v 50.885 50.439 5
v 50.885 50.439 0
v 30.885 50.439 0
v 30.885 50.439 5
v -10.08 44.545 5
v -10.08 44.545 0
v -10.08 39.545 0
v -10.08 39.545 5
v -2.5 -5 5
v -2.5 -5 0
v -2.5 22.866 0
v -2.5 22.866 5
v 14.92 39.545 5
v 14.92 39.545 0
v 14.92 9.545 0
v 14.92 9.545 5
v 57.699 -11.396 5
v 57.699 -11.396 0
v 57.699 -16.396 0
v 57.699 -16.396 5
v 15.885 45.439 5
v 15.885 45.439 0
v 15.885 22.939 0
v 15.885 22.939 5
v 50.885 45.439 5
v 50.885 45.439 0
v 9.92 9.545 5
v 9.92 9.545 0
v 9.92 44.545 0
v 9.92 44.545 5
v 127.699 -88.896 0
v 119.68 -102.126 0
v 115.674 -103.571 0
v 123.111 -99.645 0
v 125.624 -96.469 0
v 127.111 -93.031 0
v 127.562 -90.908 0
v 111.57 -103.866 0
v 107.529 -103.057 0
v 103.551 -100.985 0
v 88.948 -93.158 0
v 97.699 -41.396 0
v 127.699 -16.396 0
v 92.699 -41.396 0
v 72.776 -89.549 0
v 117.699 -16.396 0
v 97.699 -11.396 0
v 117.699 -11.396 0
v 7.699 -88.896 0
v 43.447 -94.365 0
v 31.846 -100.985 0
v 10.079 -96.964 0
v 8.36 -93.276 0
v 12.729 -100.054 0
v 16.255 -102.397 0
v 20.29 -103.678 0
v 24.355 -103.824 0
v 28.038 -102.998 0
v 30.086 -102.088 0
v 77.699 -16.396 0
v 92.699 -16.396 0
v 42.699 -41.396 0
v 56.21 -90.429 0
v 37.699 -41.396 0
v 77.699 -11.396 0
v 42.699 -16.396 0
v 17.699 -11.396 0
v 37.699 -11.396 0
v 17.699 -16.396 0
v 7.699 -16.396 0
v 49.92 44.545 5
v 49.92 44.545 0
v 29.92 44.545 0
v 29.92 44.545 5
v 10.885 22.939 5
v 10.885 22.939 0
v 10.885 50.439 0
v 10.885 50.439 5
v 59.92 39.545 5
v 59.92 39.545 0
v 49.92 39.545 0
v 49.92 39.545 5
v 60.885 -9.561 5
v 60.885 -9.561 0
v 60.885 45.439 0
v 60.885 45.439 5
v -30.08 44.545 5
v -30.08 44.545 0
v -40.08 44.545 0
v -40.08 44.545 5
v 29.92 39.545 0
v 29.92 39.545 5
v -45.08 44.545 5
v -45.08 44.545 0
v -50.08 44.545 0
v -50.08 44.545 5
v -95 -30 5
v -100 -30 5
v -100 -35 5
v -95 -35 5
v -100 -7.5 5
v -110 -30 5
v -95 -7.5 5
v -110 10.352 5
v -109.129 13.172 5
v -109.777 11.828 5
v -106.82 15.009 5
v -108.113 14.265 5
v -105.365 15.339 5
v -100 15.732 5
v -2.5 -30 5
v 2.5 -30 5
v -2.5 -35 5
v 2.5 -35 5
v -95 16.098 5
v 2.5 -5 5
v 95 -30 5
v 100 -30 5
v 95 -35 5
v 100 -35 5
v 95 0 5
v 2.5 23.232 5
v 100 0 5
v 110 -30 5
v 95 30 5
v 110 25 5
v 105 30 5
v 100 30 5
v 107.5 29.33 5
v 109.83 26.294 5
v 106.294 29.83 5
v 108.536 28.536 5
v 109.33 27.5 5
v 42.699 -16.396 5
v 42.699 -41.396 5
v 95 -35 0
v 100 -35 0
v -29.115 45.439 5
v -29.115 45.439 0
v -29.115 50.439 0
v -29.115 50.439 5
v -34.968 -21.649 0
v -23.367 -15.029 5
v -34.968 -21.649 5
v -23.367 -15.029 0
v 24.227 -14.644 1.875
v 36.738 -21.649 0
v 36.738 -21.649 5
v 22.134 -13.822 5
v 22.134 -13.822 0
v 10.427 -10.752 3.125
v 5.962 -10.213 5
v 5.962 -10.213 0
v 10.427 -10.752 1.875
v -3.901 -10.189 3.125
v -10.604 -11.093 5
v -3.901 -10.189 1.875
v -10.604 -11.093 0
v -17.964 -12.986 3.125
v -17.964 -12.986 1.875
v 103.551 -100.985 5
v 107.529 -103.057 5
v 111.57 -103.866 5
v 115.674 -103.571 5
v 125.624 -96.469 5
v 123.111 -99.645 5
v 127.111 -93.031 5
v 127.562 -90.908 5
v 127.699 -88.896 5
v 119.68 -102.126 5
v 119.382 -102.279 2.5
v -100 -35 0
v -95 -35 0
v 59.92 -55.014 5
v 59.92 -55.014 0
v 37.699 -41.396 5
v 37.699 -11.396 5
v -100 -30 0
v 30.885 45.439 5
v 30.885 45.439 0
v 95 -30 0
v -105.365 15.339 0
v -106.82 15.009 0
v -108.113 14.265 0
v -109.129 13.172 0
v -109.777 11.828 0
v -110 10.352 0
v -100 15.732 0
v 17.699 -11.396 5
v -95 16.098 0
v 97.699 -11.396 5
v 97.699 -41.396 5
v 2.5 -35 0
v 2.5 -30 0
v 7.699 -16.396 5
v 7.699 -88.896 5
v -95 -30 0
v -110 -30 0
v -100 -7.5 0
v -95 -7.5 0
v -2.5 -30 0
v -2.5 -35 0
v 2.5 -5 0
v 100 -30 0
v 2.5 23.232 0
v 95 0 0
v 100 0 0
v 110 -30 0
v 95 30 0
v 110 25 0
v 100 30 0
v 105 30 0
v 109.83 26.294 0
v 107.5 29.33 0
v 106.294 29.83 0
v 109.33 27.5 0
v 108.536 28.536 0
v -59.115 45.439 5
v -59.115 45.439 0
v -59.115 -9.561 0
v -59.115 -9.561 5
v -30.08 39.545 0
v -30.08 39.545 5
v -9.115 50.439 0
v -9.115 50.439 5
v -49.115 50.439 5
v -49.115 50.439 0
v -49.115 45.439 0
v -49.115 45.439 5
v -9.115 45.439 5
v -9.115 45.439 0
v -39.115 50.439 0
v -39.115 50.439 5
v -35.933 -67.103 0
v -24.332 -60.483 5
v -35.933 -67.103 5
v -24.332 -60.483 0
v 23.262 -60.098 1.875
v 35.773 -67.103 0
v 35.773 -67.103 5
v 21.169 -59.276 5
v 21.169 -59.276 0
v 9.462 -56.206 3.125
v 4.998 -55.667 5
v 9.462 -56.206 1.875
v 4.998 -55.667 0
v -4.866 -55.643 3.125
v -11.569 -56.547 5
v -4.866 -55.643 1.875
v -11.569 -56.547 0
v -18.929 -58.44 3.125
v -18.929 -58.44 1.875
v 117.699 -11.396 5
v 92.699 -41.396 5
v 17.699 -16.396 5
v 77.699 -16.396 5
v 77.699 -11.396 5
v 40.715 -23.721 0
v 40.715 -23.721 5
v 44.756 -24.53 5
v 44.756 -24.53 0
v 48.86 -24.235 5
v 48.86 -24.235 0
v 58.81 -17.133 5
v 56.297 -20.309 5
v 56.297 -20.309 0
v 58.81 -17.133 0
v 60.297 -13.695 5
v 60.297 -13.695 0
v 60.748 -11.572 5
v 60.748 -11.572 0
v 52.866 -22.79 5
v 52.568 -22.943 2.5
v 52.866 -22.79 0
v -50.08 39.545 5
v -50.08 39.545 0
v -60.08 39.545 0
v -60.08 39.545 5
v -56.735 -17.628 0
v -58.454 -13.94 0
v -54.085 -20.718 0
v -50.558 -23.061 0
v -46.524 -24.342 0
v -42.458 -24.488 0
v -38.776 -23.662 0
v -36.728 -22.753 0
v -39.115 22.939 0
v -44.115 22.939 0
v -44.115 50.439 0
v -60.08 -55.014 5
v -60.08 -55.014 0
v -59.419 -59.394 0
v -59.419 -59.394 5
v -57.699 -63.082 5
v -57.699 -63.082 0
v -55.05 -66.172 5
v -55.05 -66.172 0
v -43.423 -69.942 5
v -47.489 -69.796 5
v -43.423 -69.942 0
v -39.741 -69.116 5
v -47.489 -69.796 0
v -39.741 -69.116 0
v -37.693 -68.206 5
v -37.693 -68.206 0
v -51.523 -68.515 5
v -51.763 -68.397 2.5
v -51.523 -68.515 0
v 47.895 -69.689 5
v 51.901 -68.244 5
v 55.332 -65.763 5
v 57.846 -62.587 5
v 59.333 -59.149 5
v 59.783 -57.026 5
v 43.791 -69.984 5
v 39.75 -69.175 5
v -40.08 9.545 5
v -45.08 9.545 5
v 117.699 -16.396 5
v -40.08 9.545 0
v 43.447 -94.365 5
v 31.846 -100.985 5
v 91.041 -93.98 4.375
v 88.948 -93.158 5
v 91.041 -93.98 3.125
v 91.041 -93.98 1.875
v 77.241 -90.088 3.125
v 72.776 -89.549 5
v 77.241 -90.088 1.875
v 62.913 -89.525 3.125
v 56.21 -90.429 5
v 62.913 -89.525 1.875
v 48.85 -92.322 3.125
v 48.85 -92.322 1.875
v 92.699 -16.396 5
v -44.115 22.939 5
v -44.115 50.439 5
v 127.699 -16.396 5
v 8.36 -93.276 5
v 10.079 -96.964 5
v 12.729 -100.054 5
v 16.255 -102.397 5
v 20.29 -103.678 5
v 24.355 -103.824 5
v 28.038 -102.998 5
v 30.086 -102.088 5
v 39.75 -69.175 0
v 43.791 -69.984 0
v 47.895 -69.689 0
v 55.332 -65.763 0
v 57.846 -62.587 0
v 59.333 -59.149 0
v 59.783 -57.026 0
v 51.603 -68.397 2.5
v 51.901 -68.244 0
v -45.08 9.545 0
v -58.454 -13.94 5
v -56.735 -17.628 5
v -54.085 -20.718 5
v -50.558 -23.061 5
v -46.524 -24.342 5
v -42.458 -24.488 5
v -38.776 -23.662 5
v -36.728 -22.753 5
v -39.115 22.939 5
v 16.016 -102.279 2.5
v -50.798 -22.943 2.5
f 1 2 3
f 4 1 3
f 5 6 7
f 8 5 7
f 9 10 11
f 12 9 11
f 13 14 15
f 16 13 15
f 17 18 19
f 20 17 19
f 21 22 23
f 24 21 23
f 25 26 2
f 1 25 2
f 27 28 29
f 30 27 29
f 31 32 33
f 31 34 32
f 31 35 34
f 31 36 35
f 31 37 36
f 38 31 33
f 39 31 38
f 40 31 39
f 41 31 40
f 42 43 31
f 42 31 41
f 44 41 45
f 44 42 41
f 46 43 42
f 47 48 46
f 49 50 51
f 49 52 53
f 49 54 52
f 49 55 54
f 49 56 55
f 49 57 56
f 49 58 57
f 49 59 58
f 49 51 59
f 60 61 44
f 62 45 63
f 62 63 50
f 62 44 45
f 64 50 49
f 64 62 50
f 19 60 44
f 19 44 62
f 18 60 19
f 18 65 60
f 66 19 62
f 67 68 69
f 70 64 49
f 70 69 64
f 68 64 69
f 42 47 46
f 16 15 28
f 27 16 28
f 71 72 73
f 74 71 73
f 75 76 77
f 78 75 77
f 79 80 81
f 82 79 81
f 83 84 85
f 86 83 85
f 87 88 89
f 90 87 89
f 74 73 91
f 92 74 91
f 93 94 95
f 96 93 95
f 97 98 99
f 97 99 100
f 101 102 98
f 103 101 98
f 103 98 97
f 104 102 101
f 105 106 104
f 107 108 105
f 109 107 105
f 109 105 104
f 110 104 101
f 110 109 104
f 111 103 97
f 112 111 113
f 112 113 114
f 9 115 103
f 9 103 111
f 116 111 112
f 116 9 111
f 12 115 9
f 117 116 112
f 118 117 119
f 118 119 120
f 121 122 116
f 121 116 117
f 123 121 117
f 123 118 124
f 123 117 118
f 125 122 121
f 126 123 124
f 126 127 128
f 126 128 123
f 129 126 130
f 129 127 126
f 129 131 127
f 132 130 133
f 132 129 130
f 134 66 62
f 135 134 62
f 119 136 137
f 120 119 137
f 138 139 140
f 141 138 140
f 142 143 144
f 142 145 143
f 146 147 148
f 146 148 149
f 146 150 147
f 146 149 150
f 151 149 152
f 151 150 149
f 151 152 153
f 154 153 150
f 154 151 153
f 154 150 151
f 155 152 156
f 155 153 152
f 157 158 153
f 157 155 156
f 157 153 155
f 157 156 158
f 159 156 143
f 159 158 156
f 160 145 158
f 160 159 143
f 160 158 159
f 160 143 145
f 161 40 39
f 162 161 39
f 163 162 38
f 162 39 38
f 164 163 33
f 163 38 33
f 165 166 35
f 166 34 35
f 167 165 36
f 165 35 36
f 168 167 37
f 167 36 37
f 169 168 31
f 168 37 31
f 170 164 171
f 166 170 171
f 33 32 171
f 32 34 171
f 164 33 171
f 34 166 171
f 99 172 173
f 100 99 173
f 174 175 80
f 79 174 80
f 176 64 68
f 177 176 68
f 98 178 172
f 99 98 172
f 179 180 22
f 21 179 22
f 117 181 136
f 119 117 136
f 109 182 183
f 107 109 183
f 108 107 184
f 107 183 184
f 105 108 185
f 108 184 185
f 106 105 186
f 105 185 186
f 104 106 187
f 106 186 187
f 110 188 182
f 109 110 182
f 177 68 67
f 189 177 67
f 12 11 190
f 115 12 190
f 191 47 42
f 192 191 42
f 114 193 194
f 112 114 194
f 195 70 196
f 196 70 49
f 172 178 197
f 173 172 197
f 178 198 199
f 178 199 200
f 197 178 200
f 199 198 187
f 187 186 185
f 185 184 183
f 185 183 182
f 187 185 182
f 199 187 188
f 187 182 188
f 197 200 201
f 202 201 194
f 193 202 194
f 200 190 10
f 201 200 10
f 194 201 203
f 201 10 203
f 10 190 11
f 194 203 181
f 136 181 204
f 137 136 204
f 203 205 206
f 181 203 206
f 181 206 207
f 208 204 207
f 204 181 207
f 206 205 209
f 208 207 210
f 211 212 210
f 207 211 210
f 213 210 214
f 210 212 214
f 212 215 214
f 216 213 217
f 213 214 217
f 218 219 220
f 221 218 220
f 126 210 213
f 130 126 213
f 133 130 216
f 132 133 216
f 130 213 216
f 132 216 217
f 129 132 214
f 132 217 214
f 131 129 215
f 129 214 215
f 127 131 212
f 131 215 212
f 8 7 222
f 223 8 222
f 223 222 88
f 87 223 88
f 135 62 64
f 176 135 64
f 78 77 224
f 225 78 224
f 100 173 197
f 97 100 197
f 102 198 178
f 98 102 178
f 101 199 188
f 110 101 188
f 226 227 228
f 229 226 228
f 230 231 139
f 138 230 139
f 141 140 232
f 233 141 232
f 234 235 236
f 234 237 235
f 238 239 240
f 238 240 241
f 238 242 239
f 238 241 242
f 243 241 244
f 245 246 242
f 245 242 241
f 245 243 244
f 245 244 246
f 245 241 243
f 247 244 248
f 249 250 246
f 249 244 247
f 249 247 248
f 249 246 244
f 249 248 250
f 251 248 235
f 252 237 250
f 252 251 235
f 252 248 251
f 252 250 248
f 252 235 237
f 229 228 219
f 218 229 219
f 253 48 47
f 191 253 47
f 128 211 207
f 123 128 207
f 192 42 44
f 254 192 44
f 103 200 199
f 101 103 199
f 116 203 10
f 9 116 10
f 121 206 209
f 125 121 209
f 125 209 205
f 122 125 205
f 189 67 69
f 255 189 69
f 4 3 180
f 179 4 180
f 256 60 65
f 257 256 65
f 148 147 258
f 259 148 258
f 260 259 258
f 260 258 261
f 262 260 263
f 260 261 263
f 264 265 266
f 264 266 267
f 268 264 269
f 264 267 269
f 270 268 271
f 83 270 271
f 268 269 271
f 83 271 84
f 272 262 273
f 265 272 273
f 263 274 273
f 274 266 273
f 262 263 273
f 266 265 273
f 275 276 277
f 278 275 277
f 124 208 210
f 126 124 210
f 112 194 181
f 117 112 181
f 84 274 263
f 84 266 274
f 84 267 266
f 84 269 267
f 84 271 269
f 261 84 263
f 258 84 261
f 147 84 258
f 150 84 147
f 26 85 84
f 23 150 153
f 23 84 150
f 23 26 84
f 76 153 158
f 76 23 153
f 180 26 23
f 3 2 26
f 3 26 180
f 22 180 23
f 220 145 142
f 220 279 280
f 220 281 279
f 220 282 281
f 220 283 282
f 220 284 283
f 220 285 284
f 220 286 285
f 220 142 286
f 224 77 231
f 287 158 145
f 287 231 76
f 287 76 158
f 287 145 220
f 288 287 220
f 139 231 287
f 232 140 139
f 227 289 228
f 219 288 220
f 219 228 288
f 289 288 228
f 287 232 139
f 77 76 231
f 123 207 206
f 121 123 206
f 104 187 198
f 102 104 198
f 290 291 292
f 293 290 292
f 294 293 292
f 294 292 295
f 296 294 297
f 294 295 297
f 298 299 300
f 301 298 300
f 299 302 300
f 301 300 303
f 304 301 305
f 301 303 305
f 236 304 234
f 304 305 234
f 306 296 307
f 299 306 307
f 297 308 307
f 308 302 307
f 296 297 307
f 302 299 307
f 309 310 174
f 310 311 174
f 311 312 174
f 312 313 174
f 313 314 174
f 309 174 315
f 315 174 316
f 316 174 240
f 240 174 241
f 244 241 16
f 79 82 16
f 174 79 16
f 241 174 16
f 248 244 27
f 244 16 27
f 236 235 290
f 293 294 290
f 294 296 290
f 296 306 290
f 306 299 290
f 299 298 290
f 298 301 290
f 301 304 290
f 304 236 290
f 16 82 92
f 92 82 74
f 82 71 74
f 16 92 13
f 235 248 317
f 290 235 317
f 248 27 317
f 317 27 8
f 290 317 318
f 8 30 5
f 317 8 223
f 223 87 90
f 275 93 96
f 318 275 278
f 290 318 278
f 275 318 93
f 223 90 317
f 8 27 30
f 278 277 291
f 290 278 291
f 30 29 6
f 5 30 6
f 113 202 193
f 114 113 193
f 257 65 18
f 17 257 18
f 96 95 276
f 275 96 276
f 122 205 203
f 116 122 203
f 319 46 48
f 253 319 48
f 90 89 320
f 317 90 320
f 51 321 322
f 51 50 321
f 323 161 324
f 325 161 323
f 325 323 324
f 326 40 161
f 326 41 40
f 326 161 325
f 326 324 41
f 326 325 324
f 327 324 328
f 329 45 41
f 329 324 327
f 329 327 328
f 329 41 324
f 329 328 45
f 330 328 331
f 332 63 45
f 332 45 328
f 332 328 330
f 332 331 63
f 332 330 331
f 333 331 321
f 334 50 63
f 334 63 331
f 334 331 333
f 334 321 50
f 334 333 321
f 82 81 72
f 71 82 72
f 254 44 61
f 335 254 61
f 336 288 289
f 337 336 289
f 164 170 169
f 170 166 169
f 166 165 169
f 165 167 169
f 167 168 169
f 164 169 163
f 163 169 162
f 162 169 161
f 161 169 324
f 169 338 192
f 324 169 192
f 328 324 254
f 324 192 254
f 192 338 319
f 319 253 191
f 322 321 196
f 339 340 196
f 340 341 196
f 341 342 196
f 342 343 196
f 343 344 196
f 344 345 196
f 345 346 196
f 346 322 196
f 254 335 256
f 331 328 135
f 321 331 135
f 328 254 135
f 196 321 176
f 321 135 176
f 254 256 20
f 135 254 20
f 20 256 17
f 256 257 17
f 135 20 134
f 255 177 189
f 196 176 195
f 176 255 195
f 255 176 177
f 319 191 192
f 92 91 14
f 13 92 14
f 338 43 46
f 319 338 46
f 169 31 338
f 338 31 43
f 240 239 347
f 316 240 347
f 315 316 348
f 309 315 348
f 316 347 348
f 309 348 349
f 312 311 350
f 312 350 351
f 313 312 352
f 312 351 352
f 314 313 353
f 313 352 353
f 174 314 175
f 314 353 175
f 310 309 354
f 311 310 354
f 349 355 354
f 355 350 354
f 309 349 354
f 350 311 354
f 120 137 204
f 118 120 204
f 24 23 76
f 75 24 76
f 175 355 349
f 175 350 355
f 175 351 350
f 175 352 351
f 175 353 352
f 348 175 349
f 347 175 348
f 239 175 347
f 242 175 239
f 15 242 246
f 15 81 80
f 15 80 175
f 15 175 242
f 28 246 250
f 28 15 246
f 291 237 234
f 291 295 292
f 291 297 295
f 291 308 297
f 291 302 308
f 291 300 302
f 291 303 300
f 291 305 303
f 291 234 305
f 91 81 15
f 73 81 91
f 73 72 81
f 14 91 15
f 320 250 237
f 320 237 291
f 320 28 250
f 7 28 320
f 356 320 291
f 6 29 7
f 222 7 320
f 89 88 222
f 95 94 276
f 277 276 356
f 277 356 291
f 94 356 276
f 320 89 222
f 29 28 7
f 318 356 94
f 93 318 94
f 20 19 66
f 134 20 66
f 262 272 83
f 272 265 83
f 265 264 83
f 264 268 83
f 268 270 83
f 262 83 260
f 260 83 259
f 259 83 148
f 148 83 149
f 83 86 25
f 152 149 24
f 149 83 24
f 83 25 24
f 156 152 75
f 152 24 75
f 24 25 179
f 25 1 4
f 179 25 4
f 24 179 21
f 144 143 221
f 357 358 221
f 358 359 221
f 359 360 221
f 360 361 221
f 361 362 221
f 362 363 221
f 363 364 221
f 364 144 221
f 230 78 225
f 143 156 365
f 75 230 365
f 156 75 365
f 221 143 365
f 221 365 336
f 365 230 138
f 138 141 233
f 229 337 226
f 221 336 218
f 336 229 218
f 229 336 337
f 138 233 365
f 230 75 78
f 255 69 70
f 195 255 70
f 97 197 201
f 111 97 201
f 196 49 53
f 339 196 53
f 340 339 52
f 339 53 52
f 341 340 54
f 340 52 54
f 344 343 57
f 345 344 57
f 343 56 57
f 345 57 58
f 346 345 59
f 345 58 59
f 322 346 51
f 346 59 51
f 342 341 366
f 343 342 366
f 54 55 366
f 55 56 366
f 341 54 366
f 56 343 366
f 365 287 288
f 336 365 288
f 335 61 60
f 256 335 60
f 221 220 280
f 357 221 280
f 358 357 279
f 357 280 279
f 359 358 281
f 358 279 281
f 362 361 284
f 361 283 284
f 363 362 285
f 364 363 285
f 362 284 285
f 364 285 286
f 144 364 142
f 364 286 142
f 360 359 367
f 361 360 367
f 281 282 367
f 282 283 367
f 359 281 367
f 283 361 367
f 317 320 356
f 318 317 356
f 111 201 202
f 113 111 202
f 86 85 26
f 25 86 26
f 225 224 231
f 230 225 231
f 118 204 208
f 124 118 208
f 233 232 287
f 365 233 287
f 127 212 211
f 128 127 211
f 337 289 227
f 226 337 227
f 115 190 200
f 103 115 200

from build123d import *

# Parameters (mm, degrees)
F5_DEPTH = 5
F6_DEPTH = 5
F7_DEPTH = 5
F8_DEPTH = 5


# Not quite as in the source:
# - the dataset's text gives a spline's control points without its knots; the knots are read off the source's solid


with BuildPart() as f5:
    # F1 (on Top) → F5 (new body)
    with BuildSketch(Plane.XY):
        with BuildLine():
            add(Edge.make_bspline(
                [(35.7727633026, -67.1033849488), (33.1888546546, -65.2263313398), (27.7258131524, -61.8786878763), (18.8464933001, -58.2010364024), (9.5012368587, -55.9575441024), (-0.0799322126, -55.2035239896), (-9.661101284, -55.9575441023), (-19.0063577254, -58.2010364023), (-27.8856775777, -61.8786878761), (-33.3487190799, -65.2263313396), (-35.932627728, -67.1033849485)],
                knots=[0.2739165322, 0.2739165322, 0.2739165322, 0.2739165322, 0.3304373991, 0.3869582661, 0.443479133, 0.5, 0.556520867, 0.6130417339, 0.6695626009, 0.7260834678, 0.7260834678, 0.7260834678, 0.7260834678], degree=3))
            add(Edge.make_bspline(
                [(35.7727633017, -67.1033849481), (59.9200677872, -84.6449435725), (59.9200677872, -55.0144236535)],
                knots=[0.9372459818, 0.9372459818, 0.9372459818, 3.1415926536, 3.1415926536, 3.1415926536], degree=2, weights=[1, 0.4516581587, 1]))
            Line((59.9200677872, -55.0144236535), (59.9200677872, 39.5451359728))
            Line((59.9200677872, 39.5451359728), (49.9200677872, 39.5451359728))
            Line((49.9200677872, 39.5451359728), (49.9200677872, 44.5451359728))
            Line((49.9200677872, 44.5451359728), (29.9200677872, 44.5451359728))
            Line((29.9200677872, 44.5451359728), (29.9200677872, 39.5451359728))
            Line((29.9200677872, 39.5451359728), (14.9200677872, 39.5451359728))
            Line((14.9200677872, 39.5451359728), (14.9200677872, 9.5451359728))
            Line((14.9200677872, 9.5451359728), (9.9200677872, 9.5451359728))
            Line((9.9200677872, 9.5451359728), (9.9200677872, 39.5451359728))
            Line((9.9200677872, 39.5451359728), (9.9200677872, 44.5451359728))
            Line((9.9200677872, 44.5451359728), (-10.0799322128, 44.5451359728))
            Line((-10.0799322128, 44.5451359728), (-10.0799322128, 39.5451359728))
            Line((-10.0799322128, 39.5451359728), (-30.0799322128, 39.5451359728))
            Line((-30.0799322128, 39.5451359728), (-30.0799322128, 44.5451359728))
            Line((-30.0799322128, 44.5451359728), (-40.0799322128, 44.5451359728))
            Line((-40.0799322128, 44.5451359728), (-40.0799322128, 9.5451359728))
            Line((-40.0799322128, 9.5451359728), (-45.0799322128, 9.5451359728))
            Line((-45.0799322128, 9.5451359728), (-45.0799322128, 39.5451359728))
            Line((-45.0799322128, 39.5451359728), (-45.0799322128, 44.5451359728))
            Line((-45.0799322128, 44.5451359728), (-50.0799322128, 44.5451359728))
            Line((-50.0799322128, 44.5451359728), (-50.0799322128, 39.5451359728))
            Line((-50.0799322128, 39.5451359728), (-60.0799322128, 39.5451359728))
            Line((-60.0799322128, 39.5451359728), (-60.0799322128, -55.0144236535))
            add(Edge.make_bspline(
                [(-60.0799322128, -55.0144236535), (-60.0799322128, -84.6449435725), (-35.9326277274, -67.1033849481)],
                knots=[0, 0, 0, 2.2043466718, 2.2043466718, 2.2043466718], degree=2, weights=[1, 0.4516581587, 1]))
        make_face()
    extrude(amount=F5_DEPTH)


with BuildPart() as f6:
    # F2 (on Top) → F6 (new body)
    with BuildSketch(Plane.XY):
        with BuildLine():
            add(Edge.make_bspline(
                [(103.5514379038, -100.9854254094), (100.9675292558, -99.1083718005), (95.5044877536, -95.760728337), (86.6251679013, -92.083076863), (77.2799114599, -89.8395845631), (67.6987423886, -89.0855644503), (58.1175733172, -89.839584563), (48.7723168758, -92.0830768629), (39.8929970235, -95.7607283368), (34.4299555213, -99.1083718002), (31.8460468732, -100.9854254092)],
                knots=[0.2739165322, 0.2739165322, 0.2739165322, 0.2739165322, 0.3304373991, 0.3869582661, 0.443479133, 0.5, 0.556520867, 0.6130417339, 0.6695626009, 0.7260834678, 0.7260834678, 0.7260834678, 0.7260834678], degree=3))
            add(Edge.make_bspline(
                [(103.5514379029, -100.9854254088), (127.6987423883, -118.5269840331), (127.6987423883, -88.8964641141)],
                knots=[0.9372459818, 0.9372459818, 0.9372459818, 3.1415926536, 3.1415926536, 3.1415926536], degree=2, weights=[1, 0.4516581587, 1]))
            Line((127.6987423883, -88.8964641141), (127.6987423883, -16.3964641141))
            Line((127.6987423883, -16.3964641141), (117.6987423883, -16.3964641141))
            Line((117.6987423883, -16.3964641141), (117.6987423883, -11.3964641141))
            Line((117.6987423883, -11.3964641141), (97.6987423883, -11.3964641141))
            Line((97.6987423883, -11.3964641141), (97.6987423883, -41.3964641141))
            Line((97.6987423883, -41.3964641141), (92.6987423883, -41.3964641141))
            Line((92.6987423883, -41.3964641141), (92.6987423883, -16.3964641141))
            Line((92.6987423883, -16.3964641141), (77.6987423883, -16.3964641141))
            Line((77.6987423883, -16.3964641141), (77.6987423883, -11.3964641141))
            Line((77.6987423883, -11.3964641141), (57.6987423883, -11.3964641141))
            Line((57.6987423883, -11.3964641141), (57.6987423883, -16.3964641141))
            Line((57.6987423883, -16.3964641141), (42.6987423883, -16.3964641141))
            Line((42.6987423883, -16.3964641141), (42.6987423883, -41.3964641141))
            Line((42.6987423883, -41.3964641141), (37.6987423883, -41.3964641141))
            Line((37.6987423883, -41.3964641141), (37.6987423883, -11.3964641141))
            Line((37.6987423883, -11.3964641141), (17.6987423883, -11.3964641141))
            Line((17.6987423883, -11.3964641141), (17.6987423883, -16.3964641141))
            Line((17.6987423883, -16.3964641141), (7.6987423883, -16.3964641141))
            Line((7.6987423883, -16.3964641141), (7.6987423883, -88.8964641141))
            add(Edge.make_bspline(
                [(7.6987423883, -88.8964641141), (7.6987423883, -118.5269840331), (31.8460468738, -100.9854254088)],
                knots=[0, 0, 0, 2.2043466718, 2.2043466718, 2.2043466718], degree=2, weights=[1, 0.4516581587, 1]))
        make_face()
    extrude(amount=F6_DEPTH)


with BuildPart() as f7:
    # F4 (on Top) → F7 (new body)
    with BuildSketch(Plane.XY):
        with BuildLine():
            add(Edge.make_bspline(
                [(36.7376570142, -21.649473493), (34.1537483662, -19.772419884), (28.690706864, -16.4247764205), (19.8113870117, -12.7471249466), (10.4661305703, -10.5036326466), (0.884961499, -9.7496125338), (-8.6962075724, -10.5036326465), (-18.0414640138, -12.7471249464), (-26.9207838661, -16.4247764203), (-32.3838253683, -19.7724198838), (-34.9677340164, -21.6494734927)],
                knots=[0.2739165322, 0.2739165322, 0.2739165322, 0.2739165322, 0.3304373991, 0.3869582661, 0.443479133, 0.5, 0.556520867, 0.6130417339, 0.6695626009, 0.7260834678, 0.7260834678, 0.7260834678, 0.7260834678], degree=3))
            add(Edge.make_bspline(
                [(36.7376570133, -21.6494734923), (60.8849614988, -39.1910321167), (60.8849614988, -9.5605121977)],
                knots=[0.9372459818, 0.9372459818, 0.9372459818, 3.1415926536, 3.1415926536, 3.1415926536], degree=2, weights=[1, 0.4516581587, 1]))
            Line((60.8849614988, -9.5605121977), (60.8849614988, 45.4394878023))
            Line((60.8849614988, 45.4394878023), (50.8849614988, 45.4394878023))
            Line((50.8849614988, 45.4394878023), (50.8849614988, 50.4394878023))
            Line((50.8849614988, 50.4394878023), (30.8849614988, 50.4394878023))
            Line((30.8849614988, 50.4394878023), (30.8849614988, 45.4394878023))
            Line((30.8849614988, 45.4394878023), (15.8849614988, 45.4394878023))
            Line((15.8849614988, 45.4394878023), (15.8849614988, 22.9394878023))
            Line((15.8849614988, 22.9394878023), (10.8849614988, 22.9394878023))
            Line((10.8849614988, 22.9394878023), (10.8849614988, 45.4394878023))
            Line((10.8849614988, 45.4394878023), (10.8849614988, 50.4394878023))
            Line((10.8849614988, 50.4394878023), (-9.1150385012, 50.4394878023))
            Line((-9.1150385012, 50.4394878023), (-9.1150385012, 45.4394878023))
            Line((-9.1150385012, 45.4394878023), (-29.1150385012, 45.4394878023))
            Line((-29.1150385012, 45.4394878023), (-29.1150385012, 50.4394878023))
            Line((-29.1150385012, 50.4394878023), (-39.1150385012, 50.4394878023))
            Line((-39.1150385012, 50.4394878023), (-39.1150385012, 22.9394878023))
            Line((-39.1150385012, 22.9394878023), (-44.1150385012, 22.9394878023))
            Line((-44.1150385012, 22.9394878023), (-44.1150385012, 45.4394878023))
            Line((-44.1150385012, 45.4394878023), (-44.1150385012, 50.4394878023))
            Line((-44.1150385012, 50.4394878023), (-49.1150385012, 50.4394878023))
            Line((-49.1150385012, 50.4394878023), (-49.1150385012, 45.4394878023))
            Line((-49.1150385012, 45.4394878023), (-59.1150385012, 45.4394878023))
            Line((-59.1150385012, 45.4394878023), (-59.1150385012, -9.5605121977))
            add(Edge.make_bspline(
                [(-59.1150385012, -9.5605121977), (-59.1150385012, -39.1910321167), (-34.9677340158, -21.6494734923)],
                knots=[0, 0, 0, 2.2043466718, 2.2043466718, 2.2043466718], degree=2, weights=[1, 0.4516581587, 1]))
        make_face()
    extrude(amount=F7_DEPTH)


with BuildPart() as f8:
    # F3 (on Top) → F8 (new body)
    with BuildSketch(Plane.XY):
        with BuildLine():
            Line((100, -30), (110, -30))
            Line((110, -30), (110, 25))
            ThreePointArc((110, 25), (108.5355339059, 28.5355339059), (105, 30))
            Line((105, 30), (100, 30))
            Line((100, 30), (100, 0))
            Line((100, 0), (95, 0))
            Line((95, 0), (95, 30))
            Line((95, 30), (2.5, 23.2317073171))
            Line((2.5, 23.2317073171), (2.5, -5))
            Line((2.5, -5), (-2.5, -5))
            Line((-2.5, -5), (-2.5, 22.8658536585))
            Line((-2.5, 22.8658536585), (-95, 16.0975609756))
            Line((-95, 16.0975609756), (-95, -7.5))
            Line((-95, -7.5), (-100, -7.5))
            Line((-100, -7.5), (-100, 15.7317073171))
            Line((-100, 15.7317073171), (-105.3648781916, 15.3391552543))
            ThreePointArc((-105.3648781916, 15.3391552543), (-108.6622664402, 13.7565730807), (-110, 10.3524866363))
            Line((-110, 10.3524866363), (-110, -30))
            Line((-110, -30), (-100, -30))
            Line((-100, -30), (-100, -35))
            Line((-100, -35), (-95, -35))
            Line((-95, -35), (-95, -30))
            Line((-95, -30), (-2.5, -30))
            Line((-2.5, -30), (-2.5, -35))
            Line((-2.5, -35), (2.5, -35))
            Line((2.5, -35), (2.5, -30))
            Line((2.5, -30), (95, -30))
            Line((95, -30), (95, -35))
            Line((95, -35), (100, -35))
            Line((100, -35), (100, -30))
        make_face()
    extrude(amount=F8_DEPTH)


solid = Compound([f5.part, f6.part, f7.part, f8.part])
